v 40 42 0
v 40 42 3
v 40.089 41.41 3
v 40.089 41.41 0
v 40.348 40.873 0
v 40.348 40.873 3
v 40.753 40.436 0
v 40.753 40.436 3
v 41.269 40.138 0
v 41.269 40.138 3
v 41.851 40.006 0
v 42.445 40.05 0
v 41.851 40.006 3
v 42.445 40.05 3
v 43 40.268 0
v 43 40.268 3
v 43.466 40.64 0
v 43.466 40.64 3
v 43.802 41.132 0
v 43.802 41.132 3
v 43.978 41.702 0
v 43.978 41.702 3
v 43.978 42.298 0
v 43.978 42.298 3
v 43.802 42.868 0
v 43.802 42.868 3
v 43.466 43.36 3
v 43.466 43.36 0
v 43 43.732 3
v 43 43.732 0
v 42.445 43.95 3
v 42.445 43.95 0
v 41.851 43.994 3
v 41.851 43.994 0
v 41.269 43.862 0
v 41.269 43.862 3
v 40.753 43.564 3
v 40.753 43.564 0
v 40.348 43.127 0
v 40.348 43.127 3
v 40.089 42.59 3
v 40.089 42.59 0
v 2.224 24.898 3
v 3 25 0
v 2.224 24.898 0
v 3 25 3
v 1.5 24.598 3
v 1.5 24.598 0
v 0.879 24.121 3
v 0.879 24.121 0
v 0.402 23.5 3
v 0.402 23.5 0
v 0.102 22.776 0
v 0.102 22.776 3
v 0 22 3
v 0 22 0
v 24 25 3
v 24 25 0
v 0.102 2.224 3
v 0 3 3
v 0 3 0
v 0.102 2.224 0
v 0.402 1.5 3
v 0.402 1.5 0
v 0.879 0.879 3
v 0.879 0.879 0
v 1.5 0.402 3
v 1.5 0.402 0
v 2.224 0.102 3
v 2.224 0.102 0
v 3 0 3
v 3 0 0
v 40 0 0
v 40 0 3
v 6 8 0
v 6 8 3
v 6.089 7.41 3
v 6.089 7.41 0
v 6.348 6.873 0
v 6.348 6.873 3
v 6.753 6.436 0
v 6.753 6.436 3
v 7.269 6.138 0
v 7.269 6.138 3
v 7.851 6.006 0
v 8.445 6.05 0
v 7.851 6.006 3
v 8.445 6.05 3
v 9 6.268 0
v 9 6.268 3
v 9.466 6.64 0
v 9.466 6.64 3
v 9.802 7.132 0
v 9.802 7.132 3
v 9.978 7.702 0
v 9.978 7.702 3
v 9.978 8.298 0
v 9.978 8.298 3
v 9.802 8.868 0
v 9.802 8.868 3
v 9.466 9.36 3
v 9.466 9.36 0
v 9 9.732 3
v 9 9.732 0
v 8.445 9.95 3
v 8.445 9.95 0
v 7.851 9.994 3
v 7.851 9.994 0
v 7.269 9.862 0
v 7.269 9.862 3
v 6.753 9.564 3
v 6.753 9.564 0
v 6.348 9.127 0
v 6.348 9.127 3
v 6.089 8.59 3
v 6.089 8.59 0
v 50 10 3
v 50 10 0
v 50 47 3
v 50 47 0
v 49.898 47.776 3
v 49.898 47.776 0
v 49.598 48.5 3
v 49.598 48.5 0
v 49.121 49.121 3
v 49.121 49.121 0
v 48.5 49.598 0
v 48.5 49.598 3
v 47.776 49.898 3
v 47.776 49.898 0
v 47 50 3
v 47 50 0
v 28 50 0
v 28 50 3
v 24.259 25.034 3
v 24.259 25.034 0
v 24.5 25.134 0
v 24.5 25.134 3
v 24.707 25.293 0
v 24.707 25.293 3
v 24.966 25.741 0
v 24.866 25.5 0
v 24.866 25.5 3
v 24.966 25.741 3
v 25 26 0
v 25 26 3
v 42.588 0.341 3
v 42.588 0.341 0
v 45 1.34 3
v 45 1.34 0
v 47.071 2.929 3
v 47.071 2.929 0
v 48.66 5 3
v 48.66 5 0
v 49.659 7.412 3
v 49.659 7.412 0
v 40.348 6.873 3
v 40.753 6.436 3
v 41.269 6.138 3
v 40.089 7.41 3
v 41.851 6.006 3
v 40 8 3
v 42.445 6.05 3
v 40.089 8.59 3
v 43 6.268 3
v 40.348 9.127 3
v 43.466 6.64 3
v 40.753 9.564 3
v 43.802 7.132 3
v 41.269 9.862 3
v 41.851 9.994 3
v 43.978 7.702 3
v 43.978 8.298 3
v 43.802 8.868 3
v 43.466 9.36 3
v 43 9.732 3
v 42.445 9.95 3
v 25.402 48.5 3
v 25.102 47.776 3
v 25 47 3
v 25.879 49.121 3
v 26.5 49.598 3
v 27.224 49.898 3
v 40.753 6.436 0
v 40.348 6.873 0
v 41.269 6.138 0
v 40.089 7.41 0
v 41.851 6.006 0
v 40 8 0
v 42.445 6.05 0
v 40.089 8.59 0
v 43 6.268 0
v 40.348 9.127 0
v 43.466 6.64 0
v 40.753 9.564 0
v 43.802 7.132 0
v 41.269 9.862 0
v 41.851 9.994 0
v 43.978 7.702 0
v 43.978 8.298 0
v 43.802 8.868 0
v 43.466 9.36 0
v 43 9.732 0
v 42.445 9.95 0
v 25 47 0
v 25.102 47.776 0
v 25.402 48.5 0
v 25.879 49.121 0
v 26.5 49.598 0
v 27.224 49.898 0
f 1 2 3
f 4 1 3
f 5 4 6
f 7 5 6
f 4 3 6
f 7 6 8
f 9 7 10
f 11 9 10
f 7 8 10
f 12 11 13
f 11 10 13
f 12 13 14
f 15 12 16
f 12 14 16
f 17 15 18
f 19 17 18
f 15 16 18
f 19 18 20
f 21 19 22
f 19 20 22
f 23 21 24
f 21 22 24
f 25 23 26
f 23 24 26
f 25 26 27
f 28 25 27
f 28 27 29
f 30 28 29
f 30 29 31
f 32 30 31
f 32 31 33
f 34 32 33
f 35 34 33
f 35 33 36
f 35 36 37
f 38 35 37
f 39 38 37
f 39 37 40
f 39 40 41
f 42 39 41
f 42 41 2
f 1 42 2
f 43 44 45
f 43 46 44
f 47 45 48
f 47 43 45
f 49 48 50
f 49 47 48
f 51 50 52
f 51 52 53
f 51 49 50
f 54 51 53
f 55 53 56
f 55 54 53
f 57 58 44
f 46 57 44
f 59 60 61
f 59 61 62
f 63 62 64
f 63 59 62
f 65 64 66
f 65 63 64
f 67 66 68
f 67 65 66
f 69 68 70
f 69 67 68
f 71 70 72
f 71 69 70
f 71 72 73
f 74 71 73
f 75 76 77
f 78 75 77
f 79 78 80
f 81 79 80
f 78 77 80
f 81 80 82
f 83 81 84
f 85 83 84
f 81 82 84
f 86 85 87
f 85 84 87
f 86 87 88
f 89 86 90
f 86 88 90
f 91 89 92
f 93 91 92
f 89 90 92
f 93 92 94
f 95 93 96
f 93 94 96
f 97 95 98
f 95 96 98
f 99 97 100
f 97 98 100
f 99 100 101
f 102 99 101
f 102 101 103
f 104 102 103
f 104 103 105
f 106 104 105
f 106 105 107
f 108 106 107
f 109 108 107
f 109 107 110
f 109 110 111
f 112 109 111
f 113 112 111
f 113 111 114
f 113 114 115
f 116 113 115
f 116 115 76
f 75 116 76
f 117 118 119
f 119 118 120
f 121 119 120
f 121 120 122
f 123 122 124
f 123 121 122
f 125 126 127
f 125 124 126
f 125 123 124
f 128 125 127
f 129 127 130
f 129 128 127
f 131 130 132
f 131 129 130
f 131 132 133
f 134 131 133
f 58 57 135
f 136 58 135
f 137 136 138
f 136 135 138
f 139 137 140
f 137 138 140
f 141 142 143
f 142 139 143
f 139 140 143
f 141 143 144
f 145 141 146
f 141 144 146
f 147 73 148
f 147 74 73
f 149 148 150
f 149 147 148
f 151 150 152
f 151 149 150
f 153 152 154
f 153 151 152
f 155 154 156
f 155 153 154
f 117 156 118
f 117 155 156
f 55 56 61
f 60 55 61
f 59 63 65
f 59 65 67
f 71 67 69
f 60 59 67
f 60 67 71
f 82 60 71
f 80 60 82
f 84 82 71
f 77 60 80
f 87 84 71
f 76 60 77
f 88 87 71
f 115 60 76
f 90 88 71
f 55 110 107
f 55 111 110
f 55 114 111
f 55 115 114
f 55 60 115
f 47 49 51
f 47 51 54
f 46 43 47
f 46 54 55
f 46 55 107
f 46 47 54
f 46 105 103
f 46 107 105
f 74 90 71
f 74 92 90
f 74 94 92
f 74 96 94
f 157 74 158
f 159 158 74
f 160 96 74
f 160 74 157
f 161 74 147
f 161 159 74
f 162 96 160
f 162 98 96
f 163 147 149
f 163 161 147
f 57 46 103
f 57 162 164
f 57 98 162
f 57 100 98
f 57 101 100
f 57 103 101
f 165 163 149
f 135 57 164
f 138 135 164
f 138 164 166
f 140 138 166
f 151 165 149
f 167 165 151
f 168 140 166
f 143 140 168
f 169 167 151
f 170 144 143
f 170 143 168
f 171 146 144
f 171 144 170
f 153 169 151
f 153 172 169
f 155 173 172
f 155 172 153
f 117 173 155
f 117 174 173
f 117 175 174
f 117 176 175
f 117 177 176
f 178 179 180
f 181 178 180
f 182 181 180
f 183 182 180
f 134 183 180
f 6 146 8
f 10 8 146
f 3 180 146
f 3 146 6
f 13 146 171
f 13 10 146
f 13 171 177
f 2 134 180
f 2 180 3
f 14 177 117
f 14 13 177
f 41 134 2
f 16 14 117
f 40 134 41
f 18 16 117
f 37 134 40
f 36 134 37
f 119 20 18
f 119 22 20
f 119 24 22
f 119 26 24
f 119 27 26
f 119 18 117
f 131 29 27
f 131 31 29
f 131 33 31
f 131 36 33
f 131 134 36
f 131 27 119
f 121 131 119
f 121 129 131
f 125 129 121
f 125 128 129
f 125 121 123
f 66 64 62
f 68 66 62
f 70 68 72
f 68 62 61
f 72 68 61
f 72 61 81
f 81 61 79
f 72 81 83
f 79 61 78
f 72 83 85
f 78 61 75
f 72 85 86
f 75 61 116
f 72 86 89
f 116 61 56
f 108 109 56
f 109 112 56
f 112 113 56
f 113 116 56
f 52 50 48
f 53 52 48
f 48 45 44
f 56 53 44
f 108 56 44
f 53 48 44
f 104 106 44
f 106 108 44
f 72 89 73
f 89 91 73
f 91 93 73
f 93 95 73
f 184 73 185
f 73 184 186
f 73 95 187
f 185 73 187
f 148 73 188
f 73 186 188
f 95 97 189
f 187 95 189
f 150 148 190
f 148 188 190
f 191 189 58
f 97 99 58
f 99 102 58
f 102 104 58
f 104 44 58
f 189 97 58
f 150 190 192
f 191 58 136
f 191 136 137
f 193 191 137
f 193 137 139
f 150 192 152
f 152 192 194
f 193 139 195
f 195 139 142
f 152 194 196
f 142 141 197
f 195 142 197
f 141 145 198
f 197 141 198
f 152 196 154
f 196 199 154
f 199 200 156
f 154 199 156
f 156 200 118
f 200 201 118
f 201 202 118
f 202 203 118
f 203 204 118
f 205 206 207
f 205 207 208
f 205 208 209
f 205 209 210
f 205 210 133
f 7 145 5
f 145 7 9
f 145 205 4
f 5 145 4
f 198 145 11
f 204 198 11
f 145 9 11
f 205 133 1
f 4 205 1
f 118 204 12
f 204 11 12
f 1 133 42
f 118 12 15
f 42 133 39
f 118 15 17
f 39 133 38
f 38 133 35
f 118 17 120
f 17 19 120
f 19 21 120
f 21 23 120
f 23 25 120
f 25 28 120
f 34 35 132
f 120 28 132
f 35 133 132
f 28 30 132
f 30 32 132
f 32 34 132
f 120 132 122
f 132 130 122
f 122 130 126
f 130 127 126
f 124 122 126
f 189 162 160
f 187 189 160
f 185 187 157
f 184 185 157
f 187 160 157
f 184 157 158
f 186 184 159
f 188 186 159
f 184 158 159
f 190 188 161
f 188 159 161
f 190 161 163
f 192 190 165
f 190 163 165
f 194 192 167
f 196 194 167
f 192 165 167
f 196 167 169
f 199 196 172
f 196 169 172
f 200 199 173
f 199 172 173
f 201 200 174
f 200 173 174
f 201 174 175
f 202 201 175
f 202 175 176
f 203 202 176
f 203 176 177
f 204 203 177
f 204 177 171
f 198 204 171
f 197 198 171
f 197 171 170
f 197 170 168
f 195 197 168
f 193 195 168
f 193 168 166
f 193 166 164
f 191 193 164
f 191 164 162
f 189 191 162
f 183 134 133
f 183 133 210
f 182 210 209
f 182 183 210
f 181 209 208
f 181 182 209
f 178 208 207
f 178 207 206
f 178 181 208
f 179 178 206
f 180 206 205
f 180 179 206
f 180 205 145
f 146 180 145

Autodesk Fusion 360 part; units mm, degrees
sketch "Sketch1" plane through (0, 0, 0) normal (0, 0, 1) x (1, 0, 0)
  line L0 (0, 0) -> (50, 0)
  line L1 (50, 0) -> (50, 50)
  line L2 (50, 50) -> (25, 50)
  line L3 (25, 50) -> (25, 25)
  line L4 (25, 25) -> (0, 25)
  line L5 (0, 25) -> (0, 0)
  line L6 (-25, 0) -> (-25, 55) construction
  dimension "d1" = 25
  dimension "d2" = 25
  dimension "d3" = 50
  dimension "d4" = 50
extrude "Extrude1" add sketch "Sketch1" along normal blind 3
ref_plane "WorkPlane1" through (-30, 0, 0) normal (1, 0, 0) x (0, 1, 0)
sketch "Sketch2" plane through (0, 0, 3) normal (0, 0, 1) x (-1, 0, 0)
  line L0 (0, -25) -> (0, 0)
  line L1 (0, 0) -> (-50, 0)
  line L2 (-50, 0) -> (-50, -50)
  line L3 (-50, -50) -> (-25, -50)
  line L4 (-25, -50) -> (-25, -25)
  line L5 (-25, -25) -> (0, -25)
  line L6 (-100, -100) -> (-70, -100)
  line L7 (-70, -100) -> (-70, -175)
  line L8 (-70, -175) -> (-100, -175)
  line L9 (-100, -175) -> (-100, -100)
  dimension "d10" = 30
  dimension "d11" = 75
fillet "Fillet1" radius 10 1 edges at (50, 0, 1.5)
fillet "Fillet2" radius 1 1 edges at (25, 25, 1.5)
fillet "Fillet3" radius 3 1 edges at (50, 50, 1.5)
fillet "Fillet4" radius 3 1 edges at (25, 50, 1.5)
fillet "Fillet5" radius 3 1 edges at (0, 25, 1.5)
fillet "Fillet6" radius 3 1 edges at (0, 0, 1.5)
sketch "Sketch5" plane through (0, 0, 3) normal (0, 0, 1) x (-1, 0, 0)
  arc A0 (0, -3) -> (-3, 0) centre (-3, -3) ccw
  line L0 (-3, 0) -> (-40, 0)
  arc A1 (-40, 0) -> (-50, -10) centre (-40, -10) ccw
  line L1 (-50, -10) -> (-50, -47)
  arc A2 (-50, -47) -> (-47, -50) centre (-47, -47) ccw
  line L2 (-47, -50) -> (-28, -50)
  arc A3 (-28, -50) -> (-25, -47) centre (-28, -47) ccw
  line L3 (-25, -47) -> (-25, -26)
  arc A4 (-24, -25) -> (-25, -26) centre (-24, -26) ccw
  line L4 (-24, -25) -> (-3, -25)
  arc A5 (-3, -25) -> (0, -22) centre (-3, -22) ccw
  line L5 (0, -22) -> (0, -3)
  circle A6 centre (-42, -8) radius 2
  circle A7 centre (-42, -42) radius 2
  circle A8 centre (-8, -8) radius 2
  dimension "d57" = 4
  dimension "d58" = 4
  dimension "d59" = 4
  dimension "d60" = 8
  dimension "d61" = 8
  dimension "d62" = 8
  dimension "d63" = 8
  dimension "d64" = 8
  dimension "d65" = 8
extrude "Extrude7" cut sketch "Sketch5" against normal blind 3 contours A6 | A7 | A8
